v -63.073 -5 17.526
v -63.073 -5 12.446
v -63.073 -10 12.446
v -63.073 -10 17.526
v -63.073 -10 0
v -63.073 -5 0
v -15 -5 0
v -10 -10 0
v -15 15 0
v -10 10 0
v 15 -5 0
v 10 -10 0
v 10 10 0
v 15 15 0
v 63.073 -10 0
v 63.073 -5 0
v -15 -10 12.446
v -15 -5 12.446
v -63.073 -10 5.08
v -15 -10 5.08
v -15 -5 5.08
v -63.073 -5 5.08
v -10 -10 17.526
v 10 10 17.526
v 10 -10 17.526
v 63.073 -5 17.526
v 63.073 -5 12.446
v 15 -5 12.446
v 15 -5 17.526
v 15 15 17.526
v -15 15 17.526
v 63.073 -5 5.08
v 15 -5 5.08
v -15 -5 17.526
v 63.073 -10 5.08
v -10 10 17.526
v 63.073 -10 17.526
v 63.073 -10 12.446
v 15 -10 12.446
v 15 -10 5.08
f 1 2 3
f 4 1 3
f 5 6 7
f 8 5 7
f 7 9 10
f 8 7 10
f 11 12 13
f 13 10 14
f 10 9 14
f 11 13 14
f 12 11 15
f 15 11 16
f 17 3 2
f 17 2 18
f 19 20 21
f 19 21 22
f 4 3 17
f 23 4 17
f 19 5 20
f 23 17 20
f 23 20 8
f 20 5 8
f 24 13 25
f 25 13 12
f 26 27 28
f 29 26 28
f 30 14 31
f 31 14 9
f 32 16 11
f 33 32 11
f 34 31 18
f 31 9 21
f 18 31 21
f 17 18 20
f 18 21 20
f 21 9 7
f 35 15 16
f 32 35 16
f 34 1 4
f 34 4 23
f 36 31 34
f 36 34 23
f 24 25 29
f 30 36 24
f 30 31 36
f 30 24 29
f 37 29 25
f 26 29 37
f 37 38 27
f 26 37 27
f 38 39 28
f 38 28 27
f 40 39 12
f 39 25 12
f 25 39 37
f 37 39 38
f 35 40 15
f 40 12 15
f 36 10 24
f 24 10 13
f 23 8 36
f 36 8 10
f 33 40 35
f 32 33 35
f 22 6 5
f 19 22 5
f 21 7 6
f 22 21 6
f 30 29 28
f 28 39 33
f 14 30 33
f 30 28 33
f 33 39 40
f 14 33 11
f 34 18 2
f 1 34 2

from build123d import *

# Parameters (mm, degrees)
BOSS_EXTRUDE1_DEPTH     = 17.526
CUT_EXTRUDE1_DEPTH      = 69.450165313
CUT_EXTRUDE1_DEPTH_BACK = 69.450165313
SKETCH2_W               = 8.819814413
SKETCH2_H               = 7.366
SKETCH2_W_2             = 48.073484567
SKETCH2_W_3             = 56.89329898


with BuildPart() as part:
    # Sketch1 → Boss-Extrude1 (new body)
    with BuildSketch(Plane.XY):
        Polygon((10, -10), (15, -10), (63.073484567, -10), (63.073484567, -5), (15, -5), (15, 15), (-15, 15), (-15, -5), (-63.073484567, -5), (-63.073484567, -10), (-15, -10), (-10, -10), (-10, 10), (10, 10), align=None)
    extrude(amount=BOSS_EXTRUDE1_DEPTH)

    # Sketch2 → Cut-Extrude1 (cut, two sides: drawn at the far end of the back side and taken through both)
    with BuildSketch(Plane(origin=(0, -5, 0), x_dir=(1, 0, 0), z_dir=(0, 1, 0)).offset(-CUT_EXTRUDE1_DEPTH_BACK)):
        with Locations((-67.483391774, -8.763)):
            Rectangle(SKETCH2_W, SKETCH2_H)
        with Locations((-39.036742284, -8.763)):
            Rectangle(SKETCH2_W_2, SKETCH2_H)
        with Locations((43.44664949, -8.763)):
            Rectangle(SKETCH2_W_3, SKETCH2_H)
    extrude(amount=CUT_EXTRUDE1_DEPTH + CUT_EXTRUDE1_DEPTH_BACK, mode=Mode.SUBTRACT)


solid = part.part
